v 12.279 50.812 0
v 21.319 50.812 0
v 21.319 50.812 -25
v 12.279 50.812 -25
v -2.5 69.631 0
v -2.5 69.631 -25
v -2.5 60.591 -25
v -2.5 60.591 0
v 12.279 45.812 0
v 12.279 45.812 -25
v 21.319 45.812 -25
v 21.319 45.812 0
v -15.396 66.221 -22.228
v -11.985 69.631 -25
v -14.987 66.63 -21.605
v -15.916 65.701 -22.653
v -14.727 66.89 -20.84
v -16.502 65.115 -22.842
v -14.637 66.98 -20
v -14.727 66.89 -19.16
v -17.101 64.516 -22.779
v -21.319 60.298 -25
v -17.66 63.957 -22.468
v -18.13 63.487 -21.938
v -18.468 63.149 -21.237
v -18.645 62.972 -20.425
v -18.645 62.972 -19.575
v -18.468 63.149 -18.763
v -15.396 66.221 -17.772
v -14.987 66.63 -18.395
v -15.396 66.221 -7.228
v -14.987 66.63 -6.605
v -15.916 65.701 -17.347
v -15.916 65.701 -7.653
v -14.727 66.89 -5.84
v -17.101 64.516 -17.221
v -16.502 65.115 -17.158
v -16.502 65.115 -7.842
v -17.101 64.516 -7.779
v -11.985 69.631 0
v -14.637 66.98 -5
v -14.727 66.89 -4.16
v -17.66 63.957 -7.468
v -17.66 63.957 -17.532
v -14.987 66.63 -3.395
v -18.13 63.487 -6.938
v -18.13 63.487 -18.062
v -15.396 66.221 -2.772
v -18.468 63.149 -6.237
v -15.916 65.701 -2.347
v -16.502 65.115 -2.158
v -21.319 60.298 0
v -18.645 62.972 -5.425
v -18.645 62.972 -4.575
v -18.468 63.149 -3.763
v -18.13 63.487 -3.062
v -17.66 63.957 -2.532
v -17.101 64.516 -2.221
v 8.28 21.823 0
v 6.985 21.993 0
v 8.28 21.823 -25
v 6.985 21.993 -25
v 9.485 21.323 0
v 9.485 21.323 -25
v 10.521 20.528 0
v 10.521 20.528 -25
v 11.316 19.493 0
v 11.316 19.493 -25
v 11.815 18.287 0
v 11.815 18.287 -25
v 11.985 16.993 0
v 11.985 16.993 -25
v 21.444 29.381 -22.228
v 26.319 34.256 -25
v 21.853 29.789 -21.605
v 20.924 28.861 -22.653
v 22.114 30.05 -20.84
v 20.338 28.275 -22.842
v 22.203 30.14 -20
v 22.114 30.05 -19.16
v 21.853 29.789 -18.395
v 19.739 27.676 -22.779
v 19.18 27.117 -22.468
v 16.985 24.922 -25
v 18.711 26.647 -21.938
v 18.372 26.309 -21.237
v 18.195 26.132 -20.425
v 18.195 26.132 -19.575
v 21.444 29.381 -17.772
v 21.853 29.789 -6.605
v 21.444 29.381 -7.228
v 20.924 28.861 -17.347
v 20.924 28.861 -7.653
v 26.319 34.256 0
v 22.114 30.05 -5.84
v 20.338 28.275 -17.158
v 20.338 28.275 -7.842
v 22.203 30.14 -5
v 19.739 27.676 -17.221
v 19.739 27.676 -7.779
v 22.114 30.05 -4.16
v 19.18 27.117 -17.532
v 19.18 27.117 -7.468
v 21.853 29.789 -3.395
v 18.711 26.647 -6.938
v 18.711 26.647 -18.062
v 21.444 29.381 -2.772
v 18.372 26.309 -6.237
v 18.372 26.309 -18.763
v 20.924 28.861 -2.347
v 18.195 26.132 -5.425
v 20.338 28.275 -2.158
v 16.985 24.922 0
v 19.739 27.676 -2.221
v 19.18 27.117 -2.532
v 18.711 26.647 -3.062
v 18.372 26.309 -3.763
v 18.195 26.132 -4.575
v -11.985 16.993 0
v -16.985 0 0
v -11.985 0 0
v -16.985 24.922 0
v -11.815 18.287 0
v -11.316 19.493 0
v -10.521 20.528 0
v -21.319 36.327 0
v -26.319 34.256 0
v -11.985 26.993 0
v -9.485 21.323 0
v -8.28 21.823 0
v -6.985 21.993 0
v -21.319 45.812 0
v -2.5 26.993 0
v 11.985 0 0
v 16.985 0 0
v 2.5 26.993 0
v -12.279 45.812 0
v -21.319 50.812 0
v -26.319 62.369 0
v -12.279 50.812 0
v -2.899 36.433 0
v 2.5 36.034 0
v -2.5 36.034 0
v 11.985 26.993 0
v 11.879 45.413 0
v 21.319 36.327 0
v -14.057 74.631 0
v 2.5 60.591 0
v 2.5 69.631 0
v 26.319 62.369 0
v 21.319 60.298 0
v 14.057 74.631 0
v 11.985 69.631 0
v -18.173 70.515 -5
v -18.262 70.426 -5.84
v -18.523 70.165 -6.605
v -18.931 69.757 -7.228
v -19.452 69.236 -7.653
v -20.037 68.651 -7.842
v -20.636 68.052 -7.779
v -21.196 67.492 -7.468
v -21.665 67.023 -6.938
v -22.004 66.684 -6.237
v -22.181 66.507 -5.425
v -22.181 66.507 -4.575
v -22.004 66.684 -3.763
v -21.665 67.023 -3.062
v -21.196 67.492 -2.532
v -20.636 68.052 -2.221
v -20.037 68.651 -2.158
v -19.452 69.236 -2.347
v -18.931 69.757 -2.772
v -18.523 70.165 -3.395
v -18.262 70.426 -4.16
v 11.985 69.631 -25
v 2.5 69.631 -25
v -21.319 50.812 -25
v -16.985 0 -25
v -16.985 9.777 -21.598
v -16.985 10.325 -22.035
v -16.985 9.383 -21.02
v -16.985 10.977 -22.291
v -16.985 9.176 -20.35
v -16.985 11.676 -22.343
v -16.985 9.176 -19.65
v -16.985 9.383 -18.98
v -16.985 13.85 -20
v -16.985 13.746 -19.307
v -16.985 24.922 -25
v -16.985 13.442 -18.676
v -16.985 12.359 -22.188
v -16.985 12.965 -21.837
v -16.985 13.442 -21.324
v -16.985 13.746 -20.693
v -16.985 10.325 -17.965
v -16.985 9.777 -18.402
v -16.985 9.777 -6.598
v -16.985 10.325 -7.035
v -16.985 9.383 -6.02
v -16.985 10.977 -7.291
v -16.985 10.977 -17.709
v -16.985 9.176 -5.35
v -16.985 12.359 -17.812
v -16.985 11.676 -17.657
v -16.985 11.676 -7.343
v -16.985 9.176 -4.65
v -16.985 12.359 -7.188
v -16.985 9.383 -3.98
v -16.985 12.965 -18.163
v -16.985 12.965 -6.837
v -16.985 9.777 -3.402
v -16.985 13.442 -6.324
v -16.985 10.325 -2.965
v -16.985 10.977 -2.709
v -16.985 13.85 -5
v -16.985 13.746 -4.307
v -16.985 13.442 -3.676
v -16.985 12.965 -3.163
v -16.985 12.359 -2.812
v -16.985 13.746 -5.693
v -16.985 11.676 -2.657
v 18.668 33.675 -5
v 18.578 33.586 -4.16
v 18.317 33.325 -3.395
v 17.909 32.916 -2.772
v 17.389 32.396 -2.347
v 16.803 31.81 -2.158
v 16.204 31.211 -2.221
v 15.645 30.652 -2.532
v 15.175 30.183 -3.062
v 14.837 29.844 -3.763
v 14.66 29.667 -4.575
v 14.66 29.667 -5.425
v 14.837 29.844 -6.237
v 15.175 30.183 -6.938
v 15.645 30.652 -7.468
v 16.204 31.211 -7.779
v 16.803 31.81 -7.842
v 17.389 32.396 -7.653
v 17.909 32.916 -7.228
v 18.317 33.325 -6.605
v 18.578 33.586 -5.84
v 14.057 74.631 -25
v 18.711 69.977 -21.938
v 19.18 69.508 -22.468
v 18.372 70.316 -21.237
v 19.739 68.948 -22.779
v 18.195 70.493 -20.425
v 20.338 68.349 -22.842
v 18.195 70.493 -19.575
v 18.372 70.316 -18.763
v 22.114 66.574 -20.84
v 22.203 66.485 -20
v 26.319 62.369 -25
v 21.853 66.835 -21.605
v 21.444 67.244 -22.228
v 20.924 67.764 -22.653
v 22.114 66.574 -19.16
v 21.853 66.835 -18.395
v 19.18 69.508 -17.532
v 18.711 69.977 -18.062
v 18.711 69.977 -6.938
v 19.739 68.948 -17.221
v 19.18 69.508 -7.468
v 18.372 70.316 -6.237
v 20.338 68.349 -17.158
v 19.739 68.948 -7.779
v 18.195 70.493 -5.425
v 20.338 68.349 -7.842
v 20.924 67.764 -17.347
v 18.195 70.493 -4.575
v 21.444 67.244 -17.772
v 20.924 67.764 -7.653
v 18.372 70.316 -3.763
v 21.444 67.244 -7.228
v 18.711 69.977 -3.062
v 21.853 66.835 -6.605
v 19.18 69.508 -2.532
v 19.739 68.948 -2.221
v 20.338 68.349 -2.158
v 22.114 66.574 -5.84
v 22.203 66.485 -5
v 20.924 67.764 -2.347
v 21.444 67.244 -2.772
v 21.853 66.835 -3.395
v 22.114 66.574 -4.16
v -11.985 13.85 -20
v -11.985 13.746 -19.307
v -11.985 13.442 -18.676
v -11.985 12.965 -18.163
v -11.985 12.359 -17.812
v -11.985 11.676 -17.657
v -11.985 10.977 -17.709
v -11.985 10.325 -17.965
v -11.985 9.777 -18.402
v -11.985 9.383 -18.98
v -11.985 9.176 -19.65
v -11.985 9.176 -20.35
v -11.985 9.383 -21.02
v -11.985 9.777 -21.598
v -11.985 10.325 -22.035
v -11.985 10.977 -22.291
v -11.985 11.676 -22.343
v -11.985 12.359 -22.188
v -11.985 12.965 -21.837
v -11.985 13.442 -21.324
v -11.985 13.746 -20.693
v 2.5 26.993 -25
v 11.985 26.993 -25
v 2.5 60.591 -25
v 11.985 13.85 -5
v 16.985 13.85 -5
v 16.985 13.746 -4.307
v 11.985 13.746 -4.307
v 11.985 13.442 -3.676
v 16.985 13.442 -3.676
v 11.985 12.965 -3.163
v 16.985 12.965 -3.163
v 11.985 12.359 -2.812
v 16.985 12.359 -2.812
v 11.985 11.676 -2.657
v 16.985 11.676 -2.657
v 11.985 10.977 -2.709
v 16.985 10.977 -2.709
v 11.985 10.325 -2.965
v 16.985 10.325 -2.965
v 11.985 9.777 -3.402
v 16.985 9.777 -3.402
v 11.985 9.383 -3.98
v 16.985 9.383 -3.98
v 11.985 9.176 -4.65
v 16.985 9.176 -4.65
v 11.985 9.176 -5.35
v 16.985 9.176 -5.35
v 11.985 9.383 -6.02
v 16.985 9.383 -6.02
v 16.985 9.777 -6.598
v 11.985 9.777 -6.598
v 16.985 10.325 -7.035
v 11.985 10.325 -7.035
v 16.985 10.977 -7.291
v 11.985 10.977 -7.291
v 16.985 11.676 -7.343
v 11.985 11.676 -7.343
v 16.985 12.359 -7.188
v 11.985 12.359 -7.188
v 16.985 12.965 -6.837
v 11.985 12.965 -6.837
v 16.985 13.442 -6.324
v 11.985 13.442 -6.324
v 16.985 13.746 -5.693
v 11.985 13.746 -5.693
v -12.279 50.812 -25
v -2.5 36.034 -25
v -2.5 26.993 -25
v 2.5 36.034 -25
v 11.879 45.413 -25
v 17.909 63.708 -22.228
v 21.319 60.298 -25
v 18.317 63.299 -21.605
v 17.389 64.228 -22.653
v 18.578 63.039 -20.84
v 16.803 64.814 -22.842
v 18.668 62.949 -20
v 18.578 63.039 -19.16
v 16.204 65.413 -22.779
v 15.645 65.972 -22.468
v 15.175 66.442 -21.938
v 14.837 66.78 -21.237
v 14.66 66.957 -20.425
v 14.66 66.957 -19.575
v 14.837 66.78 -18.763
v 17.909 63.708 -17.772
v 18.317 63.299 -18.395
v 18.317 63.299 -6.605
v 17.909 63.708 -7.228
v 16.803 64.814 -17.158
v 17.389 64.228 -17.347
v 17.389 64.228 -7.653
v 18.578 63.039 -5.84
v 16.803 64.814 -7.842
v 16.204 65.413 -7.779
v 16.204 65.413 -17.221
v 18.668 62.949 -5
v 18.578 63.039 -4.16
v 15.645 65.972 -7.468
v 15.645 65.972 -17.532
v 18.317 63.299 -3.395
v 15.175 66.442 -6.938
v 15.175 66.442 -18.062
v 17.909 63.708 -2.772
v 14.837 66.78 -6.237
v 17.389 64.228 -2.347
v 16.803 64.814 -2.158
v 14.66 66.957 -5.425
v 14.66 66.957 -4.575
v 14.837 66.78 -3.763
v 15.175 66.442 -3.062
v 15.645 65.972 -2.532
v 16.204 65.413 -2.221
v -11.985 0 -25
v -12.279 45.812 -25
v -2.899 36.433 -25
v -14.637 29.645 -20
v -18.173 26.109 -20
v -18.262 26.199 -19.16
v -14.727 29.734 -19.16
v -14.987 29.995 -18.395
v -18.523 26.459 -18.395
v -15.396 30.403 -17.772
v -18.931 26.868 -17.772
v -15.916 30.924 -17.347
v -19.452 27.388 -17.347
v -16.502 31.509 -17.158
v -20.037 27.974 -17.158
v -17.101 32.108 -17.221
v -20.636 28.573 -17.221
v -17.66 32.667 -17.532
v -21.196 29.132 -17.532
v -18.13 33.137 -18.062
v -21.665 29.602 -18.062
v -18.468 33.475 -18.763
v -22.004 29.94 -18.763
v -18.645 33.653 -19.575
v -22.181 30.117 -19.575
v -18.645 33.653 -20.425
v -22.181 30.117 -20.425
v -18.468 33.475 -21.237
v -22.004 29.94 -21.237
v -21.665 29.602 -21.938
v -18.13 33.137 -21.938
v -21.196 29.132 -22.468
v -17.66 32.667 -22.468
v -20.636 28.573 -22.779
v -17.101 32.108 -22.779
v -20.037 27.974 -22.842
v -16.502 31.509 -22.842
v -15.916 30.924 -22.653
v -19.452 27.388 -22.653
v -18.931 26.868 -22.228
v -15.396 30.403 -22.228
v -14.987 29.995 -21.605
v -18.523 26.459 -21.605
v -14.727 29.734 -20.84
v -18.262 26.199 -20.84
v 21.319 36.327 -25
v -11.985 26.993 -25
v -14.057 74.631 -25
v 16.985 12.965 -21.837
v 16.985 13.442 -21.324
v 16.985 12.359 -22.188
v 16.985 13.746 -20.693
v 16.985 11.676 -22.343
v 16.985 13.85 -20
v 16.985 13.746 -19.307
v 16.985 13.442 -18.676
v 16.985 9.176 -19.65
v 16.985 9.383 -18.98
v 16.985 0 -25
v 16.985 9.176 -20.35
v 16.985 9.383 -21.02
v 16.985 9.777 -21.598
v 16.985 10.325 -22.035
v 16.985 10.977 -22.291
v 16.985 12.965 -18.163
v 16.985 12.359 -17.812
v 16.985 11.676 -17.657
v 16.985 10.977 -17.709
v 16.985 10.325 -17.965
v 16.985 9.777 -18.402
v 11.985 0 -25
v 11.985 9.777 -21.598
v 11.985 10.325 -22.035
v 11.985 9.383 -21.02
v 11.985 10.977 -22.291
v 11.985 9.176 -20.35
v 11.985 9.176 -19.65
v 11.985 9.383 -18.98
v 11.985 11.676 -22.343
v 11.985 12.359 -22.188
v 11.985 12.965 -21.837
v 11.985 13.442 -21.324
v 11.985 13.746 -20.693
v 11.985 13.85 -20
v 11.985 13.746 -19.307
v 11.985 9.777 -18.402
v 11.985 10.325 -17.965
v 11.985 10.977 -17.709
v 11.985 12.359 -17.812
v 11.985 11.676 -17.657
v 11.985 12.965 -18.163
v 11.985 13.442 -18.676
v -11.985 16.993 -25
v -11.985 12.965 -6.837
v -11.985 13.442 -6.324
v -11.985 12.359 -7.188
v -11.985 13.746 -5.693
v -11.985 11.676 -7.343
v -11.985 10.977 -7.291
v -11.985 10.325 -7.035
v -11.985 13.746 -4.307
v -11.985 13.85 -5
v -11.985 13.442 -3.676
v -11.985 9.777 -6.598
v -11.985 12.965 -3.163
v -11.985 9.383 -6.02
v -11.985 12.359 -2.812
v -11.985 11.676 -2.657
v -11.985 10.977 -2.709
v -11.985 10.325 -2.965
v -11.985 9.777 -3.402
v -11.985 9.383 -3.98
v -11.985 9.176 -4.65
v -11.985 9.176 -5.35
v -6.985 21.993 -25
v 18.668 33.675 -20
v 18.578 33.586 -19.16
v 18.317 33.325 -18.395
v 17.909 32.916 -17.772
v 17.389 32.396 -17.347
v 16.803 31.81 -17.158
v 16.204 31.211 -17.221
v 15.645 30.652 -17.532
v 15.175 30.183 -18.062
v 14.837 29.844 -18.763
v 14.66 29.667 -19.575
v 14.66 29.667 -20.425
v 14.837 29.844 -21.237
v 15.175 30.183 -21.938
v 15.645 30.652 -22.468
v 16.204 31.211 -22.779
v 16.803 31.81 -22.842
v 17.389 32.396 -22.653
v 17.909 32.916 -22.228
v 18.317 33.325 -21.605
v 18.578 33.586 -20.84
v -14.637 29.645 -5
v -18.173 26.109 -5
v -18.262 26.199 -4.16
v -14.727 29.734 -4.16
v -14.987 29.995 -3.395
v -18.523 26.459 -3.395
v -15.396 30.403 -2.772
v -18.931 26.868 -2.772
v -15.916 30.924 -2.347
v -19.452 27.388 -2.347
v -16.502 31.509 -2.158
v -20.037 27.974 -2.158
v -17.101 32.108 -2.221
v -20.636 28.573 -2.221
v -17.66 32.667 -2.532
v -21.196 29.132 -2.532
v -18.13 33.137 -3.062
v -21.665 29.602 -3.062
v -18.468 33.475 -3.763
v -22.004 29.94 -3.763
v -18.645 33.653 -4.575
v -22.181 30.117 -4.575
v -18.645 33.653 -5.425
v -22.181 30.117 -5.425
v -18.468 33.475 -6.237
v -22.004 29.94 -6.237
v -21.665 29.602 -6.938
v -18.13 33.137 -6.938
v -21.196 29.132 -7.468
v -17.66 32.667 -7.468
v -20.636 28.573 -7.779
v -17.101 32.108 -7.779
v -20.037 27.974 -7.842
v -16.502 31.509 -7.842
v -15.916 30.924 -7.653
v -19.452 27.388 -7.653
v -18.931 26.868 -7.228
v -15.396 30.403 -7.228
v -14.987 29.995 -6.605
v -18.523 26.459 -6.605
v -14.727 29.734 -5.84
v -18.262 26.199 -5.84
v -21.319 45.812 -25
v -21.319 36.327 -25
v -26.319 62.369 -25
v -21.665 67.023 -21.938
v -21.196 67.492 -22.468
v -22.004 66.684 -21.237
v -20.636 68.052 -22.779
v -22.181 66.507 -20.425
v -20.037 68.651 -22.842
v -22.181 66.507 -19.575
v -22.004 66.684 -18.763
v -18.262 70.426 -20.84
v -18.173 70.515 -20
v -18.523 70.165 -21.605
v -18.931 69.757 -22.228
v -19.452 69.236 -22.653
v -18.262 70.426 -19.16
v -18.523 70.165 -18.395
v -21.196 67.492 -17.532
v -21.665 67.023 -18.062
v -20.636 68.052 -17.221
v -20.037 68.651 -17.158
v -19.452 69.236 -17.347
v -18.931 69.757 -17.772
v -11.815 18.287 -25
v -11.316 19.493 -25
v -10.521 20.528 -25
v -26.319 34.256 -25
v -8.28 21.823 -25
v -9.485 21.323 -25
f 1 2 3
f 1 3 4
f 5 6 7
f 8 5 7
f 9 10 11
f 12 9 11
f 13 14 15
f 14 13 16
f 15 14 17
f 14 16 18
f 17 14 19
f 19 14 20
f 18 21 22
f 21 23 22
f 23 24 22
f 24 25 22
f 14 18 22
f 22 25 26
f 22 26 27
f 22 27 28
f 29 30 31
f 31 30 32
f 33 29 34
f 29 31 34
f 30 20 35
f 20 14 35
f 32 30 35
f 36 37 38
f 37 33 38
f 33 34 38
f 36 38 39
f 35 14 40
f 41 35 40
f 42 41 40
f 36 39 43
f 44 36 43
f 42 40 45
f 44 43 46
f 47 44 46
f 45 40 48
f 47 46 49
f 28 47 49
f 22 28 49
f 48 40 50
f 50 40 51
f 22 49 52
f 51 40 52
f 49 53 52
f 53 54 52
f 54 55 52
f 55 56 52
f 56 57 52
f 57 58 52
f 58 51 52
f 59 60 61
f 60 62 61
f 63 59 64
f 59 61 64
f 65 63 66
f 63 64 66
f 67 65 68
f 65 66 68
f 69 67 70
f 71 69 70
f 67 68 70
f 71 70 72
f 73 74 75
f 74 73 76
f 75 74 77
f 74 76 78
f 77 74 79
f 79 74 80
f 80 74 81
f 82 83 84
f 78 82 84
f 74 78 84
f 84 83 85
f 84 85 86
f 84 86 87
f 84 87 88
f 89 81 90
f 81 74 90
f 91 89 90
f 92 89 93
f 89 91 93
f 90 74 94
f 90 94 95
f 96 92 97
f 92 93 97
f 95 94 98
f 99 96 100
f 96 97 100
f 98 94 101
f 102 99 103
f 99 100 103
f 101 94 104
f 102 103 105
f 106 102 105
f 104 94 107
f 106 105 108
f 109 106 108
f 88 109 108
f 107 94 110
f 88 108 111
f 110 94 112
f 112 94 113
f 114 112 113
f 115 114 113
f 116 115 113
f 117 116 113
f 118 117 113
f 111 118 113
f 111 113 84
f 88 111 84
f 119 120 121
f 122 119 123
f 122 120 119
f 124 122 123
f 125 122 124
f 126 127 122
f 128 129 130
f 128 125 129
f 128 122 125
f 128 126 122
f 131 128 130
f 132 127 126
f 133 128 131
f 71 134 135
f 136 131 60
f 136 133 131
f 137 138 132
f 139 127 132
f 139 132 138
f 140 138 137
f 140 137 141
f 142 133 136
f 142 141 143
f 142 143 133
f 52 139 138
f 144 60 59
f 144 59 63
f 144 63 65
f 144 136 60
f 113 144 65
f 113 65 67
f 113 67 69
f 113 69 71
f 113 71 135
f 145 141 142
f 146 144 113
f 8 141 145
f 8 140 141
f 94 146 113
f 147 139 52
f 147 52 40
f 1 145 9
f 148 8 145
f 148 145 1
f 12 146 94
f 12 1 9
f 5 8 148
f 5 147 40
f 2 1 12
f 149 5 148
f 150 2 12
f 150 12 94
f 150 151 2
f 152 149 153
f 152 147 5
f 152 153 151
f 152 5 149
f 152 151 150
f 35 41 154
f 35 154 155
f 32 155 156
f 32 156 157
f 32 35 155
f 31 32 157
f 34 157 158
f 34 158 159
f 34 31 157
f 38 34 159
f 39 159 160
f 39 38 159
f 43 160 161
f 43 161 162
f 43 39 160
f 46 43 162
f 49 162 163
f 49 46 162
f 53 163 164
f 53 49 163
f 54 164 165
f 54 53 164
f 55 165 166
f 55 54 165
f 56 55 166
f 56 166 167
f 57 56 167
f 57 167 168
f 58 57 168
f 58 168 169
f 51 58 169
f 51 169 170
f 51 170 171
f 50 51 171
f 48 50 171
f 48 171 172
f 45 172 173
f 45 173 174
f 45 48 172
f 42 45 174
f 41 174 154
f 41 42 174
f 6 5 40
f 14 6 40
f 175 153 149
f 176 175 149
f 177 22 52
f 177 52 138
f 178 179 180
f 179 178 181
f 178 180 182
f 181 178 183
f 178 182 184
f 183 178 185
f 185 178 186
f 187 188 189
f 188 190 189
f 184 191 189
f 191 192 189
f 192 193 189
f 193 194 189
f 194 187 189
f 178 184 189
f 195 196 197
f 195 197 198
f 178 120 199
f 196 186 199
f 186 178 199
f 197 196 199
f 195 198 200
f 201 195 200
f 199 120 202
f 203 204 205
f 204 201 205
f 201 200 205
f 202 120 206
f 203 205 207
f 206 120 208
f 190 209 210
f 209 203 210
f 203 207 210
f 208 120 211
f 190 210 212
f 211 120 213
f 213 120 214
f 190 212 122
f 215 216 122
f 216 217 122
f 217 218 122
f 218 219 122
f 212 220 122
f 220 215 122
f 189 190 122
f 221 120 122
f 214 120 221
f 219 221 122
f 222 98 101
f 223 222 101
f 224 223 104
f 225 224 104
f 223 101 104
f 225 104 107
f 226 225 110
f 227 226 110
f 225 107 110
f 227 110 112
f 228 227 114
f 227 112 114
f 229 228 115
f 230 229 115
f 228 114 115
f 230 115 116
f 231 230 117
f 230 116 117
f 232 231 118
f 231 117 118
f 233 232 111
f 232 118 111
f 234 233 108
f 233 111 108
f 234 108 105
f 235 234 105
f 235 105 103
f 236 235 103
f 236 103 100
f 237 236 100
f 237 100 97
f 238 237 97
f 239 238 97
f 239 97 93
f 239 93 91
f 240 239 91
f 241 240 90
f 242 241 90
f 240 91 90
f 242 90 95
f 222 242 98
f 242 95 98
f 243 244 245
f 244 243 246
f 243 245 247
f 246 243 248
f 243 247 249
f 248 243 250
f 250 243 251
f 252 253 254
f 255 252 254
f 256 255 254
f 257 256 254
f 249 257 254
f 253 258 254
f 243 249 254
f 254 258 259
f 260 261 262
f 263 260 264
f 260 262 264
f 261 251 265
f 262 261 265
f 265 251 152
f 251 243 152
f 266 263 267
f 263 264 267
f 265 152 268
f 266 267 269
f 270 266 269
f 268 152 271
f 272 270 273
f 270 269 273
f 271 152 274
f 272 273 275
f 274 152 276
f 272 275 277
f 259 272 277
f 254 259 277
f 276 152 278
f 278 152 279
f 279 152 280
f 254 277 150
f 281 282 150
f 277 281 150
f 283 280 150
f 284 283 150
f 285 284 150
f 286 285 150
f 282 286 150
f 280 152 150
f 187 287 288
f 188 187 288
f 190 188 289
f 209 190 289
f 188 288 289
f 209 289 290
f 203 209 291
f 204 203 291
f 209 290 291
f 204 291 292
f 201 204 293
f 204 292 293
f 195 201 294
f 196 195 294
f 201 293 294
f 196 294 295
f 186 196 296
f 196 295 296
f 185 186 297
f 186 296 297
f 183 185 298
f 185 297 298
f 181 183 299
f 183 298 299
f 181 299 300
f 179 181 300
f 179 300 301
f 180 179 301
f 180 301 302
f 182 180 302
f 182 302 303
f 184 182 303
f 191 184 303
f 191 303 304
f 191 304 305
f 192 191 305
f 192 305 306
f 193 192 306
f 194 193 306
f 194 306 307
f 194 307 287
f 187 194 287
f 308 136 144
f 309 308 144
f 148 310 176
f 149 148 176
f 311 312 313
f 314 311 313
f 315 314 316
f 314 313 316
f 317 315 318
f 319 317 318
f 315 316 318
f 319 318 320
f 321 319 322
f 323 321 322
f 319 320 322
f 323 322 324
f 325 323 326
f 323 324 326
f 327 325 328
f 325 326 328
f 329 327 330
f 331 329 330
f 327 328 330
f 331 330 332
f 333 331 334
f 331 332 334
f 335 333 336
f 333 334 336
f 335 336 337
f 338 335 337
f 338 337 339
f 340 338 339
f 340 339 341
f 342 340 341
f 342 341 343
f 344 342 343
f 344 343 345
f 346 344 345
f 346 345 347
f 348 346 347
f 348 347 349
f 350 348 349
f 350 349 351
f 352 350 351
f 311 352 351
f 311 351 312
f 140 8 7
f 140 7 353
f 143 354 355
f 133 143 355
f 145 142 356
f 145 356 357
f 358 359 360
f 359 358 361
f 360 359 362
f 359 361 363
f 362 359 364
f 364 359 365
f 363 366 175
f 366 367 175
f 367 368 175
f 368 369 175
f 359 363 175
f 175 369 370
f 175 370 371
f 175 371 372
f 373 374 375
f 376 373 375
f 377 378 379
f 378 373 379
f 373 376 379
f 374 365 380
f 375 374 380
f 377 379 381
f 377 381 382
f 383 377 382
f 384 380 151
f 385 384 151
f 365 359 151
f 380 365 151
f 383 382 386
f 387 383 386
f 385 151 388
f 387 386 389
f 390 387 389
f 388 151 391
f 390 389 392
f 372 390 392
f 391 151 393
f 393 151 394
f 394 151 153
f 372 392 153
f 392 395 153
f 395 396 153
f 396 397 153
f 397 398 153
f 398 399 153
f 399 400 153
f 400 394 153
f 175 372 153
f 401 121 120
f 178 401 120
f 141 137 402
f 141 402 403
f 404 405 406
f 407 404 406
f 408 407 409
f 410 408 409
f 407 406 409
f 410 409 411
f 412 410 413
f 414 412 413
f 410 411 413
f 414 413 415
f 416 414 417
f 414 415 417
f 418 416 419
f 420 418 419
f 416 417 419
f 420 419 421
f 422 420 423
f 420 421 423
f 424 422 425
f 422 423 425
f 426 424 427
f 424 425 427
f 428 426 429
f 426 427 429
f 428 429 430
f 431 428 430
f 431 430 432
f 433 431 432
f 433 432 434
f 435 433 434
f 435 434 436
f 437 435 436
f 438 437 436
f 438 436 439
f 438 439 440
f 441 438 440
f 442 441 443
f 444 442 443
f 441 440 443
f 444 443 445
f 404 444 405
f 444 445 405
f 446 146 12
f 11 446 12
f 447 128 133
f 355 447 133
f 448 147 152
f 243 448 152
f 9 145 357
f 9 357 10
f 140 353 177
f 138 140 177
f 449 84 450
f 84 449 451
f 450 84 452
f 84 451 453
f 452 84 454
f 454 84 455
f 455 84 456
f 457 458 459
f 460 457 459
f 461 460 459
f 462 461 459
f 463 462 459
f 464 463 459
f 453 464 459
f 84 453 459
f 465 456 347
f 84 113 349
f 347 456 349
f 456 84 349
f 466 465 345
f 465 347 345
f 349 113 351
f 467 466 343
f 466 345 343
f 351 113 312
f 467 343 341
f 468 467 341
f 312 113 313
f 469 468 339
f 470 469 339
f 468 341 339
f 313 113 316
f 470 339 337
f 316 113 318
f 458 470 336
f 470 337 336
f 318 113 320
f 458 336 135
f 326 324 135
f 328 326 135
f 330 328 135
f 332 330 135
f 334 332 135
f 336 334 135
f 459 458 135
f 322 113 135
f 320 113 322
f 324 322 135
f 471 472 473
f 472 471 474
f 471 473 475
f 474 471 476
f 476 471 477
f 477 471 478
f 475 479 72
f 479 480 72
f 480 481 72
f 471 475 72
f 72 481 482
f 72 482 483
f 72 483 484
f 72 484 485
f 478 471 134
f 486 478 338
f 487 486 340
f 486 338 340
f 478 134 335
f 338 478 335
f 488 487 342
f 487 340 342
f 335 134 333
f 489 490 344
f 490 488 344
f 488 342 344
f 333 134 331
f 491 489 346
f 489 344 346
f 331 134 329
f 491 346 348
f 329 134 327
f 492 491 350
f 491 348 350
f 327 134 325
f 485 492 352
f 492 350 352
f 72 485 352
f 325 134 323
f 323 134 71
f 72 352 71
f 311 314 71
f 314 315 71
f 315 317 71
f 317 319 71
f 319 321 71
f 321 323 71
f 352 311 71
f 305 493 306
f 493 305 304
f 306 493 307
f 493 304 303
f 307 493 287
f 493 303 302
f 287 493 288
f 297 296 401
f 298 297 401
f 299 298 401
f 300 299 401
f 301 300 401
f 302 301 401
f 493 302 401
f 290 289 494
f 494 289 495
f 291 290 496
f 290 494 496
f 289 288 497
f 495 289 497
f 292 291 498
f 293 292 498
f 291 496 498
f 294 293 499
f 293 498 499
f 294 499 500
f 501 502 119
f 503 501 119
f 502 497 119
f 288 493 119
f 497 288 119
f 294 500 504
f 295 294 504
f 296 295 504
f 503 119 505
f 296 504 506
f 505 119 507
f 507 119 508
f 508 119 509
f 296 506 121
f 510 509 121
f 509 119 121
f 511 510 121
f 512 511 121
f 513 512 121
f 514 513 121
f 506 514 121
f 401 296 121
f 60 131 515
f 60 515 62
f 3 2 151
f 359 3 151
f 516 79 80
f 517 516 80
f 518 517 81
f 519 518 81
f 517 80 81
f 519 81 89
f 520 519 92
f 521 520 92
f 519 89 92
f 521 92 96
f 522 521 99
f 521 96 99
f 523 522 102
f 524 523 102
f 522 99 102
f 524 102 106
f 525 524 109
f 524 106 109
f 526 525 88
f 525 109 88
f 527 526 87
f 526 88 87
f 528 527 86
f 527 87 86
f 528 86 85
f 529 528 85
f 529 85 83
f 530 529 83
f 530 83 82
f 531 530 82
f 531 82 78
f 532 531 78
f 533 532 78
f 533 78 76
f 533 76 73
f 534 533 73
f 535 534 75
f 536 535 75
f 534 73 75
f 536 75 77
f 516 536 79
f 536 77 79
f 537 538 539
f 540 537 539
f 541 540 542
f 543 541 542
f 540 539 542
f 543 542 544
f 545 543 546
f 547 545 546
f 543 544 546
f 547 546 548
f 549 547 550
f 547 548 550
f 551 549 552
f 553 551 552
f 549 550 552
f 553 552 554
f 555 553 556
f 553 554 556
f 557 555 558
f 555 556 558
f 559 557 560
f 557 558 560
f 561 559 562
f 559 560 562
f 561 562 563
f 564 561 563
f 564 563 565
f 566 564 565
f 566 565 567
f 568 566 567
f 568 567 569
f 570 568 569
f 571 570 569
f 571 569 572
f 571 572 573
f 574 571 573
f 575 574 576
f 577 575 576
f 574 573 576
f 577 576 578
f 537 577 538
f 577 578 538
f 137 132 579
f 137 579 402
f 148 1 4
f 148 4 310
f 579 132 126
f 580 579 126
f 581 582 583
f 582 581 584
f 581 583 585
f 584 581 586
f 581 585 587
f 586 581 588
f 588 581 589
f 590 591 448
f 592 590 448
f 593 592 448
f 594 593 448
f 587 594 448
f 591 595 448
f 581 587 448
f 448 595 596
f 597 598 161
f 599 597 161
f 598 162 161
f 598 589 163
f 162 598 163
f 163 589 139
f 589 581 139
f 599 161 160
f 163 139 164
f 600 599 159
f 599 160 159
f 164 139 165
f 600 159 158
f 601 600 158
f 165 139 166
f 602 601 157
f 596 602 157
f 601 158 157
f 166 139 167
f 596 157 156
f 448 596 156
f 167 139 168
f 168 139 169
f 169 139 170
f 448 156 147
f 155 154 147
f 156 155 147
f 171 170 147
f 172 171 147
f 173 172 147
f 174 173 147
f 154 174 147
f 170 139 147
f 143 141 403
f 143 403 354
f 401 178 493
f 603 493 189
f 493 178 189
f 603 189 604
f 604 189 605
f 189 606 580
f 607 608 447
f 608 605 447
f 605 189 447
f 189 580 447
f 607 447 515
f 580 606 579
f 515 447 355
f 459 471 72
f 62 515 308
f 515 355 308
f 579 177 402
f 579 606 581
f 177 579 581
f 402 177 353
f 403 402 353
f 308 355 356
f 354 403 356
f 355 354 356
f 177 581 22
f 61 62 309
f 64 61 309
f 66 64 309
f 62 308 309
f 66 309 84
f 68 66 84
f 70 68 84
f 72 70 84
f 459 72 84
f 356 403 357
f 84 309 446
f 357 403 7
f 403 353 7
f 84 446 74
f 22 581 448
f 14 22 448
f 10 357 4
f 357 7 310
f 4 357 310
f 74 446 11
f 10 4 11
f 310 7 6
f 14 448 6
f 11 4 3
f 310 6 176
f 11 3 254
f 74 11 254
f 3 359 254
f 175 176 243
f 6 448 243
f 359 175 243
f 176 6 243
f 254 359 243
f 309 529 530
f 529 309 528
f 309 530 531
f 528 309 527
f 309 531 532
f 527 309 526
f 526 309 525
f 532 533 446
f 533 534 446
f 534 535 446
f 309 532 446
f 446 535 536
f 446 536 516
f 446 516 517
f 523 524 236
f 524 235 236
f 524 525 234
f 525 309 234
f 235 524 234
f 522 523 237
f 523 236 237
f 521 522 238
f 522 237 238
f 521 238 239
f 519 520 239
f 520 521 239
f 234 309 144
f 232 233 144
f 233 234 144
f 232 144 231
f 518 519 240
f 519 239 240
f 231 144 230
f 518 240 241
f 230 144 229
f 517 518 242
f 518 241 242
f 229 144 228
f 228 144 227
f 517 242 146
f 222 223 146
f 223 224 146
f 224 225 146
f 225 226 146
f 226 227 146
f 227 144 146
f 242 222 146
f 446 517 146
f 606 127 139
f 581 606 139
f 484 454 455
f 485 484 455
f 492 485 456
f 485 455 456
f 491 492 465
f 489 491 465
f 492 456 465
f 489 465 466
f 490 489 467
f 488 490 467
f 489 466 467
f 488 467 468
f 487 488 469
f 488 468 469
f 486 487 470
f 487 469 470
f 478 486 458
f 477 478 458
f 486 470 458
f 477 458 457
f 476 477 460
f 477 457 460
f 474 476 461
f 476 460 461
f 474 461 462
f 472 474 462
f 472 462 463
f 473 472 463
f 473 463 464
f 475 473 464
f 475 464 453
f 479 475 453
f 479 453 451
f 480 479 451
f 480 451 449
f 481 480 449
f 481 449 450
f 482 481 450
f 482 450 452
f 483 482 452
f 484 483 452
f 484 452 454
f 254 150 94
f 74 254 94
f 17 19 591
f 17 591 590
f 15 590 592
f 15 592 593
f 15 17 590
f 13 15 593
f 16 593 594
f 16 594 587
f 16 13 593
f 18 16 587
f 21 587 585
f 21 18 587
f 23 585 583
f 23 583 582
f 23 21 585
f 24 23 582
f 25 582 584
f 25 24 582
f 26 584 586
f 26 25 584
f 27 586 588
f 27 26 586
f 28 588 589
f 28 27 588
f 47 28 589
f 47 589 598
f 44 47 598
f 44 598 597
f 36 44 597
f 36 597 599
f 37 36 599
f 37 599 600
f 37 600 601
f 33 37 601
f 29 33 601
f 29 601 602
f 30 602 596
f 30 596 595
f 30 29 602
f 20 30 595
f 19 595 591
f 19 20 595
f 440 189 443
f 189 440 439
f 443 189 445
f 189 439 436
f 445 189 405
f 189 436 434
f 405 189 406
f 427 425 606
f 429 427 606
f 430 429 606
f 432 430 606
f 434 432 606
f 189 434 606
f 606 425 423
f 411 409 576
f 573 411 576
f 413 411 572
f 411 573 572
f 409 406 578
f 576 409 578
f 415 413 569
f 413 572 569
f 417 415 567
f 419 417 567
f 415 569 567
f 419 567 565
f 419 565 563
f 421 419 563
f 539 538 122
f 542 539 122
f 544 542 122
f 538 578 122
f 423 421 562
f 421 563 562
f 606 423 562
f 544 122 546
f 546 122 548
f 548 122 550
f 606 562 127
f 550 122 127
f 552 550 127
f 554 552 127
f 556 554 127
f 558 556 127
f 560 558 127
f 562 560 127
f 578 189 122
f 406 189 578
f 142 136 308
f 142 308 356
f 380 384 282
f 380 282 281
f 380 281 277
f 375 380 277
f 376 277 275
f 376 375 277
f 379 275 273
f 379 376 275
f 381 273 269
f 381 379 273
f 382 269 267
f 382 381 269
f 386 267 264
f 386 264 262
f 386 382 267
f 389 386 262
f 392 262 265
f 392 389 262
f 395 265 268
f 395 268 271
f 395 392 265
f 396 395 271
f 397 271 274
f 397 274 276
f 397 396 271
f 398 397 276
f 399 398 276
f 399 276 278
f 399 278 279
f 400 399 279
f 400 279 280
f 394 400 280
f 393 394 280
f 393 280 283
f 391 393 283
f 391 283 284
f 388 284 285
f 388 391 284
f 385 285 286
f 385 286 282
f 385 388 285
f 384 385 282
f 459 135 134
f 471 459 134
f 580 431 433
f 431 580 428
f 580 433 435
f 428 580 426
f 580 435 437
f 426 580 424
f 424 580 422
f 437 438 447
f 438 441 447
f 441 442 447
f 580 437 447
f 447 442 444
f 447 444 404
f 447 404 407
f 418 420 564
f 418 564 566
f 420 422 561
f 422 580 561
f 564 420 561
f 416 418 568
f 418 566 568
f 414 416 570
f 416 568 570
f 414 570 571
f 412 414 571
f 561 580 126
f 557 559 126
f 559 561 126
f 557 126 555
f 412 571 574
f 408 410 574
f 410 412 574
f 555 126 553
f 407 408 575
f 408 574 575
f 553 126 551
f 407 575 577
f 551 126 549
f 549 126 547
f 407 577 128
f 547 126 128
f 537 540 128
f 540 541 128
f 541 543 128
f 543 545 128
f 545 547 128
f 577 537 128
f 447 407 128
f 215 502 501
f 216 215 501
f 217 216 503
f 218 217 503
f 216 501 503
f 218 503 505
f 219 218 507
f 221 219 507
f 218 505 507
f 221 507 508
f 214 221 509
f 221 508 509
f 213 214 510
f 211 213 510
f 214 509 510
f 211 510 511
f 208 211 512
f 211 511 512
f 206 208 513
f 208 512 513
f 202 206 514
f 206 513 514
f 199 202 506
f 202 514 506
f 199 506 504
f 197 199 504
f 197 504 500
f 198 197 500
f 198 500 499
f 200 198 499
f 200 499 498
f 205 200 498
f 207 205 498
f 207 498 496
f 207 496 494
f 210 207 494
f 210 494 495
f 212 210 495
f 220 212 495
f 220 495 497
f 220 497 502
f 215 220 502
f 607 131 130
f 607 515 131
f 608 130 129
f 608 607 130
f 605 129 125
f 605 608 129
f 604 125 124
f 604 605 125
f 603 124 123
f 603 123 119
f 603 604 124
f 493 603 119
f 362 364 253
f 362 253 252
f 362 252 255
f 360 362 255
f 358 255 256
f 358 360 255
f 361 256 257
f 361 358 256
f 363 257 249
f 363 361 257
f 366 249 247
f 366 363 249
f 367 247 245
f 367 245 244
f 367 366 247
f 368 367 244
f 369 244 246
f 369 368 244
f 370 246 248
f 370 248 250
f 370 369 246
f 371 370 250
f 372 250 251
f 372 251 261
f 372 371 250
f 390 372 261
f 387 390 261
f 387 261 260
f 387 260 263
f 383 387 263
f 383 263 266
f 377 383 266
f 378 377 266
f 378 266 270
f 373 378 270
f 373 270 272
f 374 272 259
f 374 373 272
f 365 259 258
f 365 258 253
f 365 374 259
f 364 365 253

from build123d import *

# Parameters (mm, degrees)
EXTRUDE_THIN1_DEPTH = 25
SKETCH5_W           = 23.970919882
SKETCH5_H           = 5
BOSS_EXTRUDE2_DEPTH = 25
BOSS_EXTRUDE3_DEPTH = 25
SKETCH6_R           = 2.85
CUT_EXTRUDE1_DEPTH  = 5
SKETCH9_R           = 2.85
CUT_EXTRUDE2_DEPTH  = 5
CUT_EXTRUDE3_START  = -5
SKETCH10_R          = 2.85
CUT_EXTRUDE3_DEPTH  = 5
CUT_EXTRUDE4_START  = -5
SKETCH11_R          = 2.85
CUT_EXTRUDE4_DEPTH  = 5
FILLET1_R           = 5
CUT_EXTRUDE5_REACH  = 91.834
SKETCH12_R          = 2.35


with BuildPart() as part:
    # Sketch1 → Extrude-Thin1 (new body)
    with BuildSketch(Plane.XY):
        Polygon((11.985459941, 0), (11.985459941, 26.992888143), (21.319269453, 36.326697654), (21.319269453, 60.297617537), (11.985459941, 69.631427048), (-11.985459941, 69.631427048), (-21.319269453, 60.297617537), (-21.319269453, 36.326697654), (-11.985459941, 26.992888143), (-11.985459941, 0), (-16.985459941, 0), (-16.985459941, 24.921820331), (-26.319269453, 34.255629842), (-26.319269453, 62.368685348), (-14.056527753, 74.631427048), (14.056527753, 74.631427048), (26.319269453, 62.368685348), (26.319269453, 34.255629842), (16.985459941, 24.921820331), (16.985459941, 0), align=None)
    extrude(amount=-EXTRUDE_THIN1_DEPTH)

    # Sketch5 → Boss-Extrude2 (add)
    with BuildSketch(Plane.XY):
        with Locations((0, 24.492888143)):
            Rectangle(SKETCH5_W, SKETCH5_H)
    extrude(amount=-BOSS_EXTRUDE2_DEPTH)

    # Sketch3 → Boss-Extrude3 (add)
    with BuildSketch(Plane.XY):
        Polygon((-2.5, 36.033625869), (-2.5, 26.992888143), (2.5, 26.992888143), (2.5, 36.033625869), (2.899137803, 36.432763672), (11.879393924, 45.413019793), (12.278531727, 45.812157595), (21.319269453, 45.812157595), (21.319269453, 50.812157595), (12.278531727, 50.812157595), (11.879393924, 51.211295398), (2.899137803, 60.191551519), (2.5, 60.590689322), (2.5, 69.631427048), (-2.5, 69.631427048), (-2.5, 60.590689322), (-2.899137803, 60.191551519), (-12.278531727, 50.812157595), (-21.319269453, 50.812157595), (-21.319269453, 45.812157595), (-12.278531727, 45.812157595), (-2.899137803, 36.432763672), align=None)
    extrude(amount=-BOSS_EXTRUDE3_DEPTH)

    # Sketch6 → Cut-Extrude1 (cut)
    with BuildSketch(Plane(origin=(3.968180195, 3.968180195, 0), x_dir=(0, 0, 1), z_dir=(-0.7071067811865479, -0.7071067811865471, 0))):
        with Locations(Location((-20, 34.161854249, 0), (0, 0, 270))):
            Circle(SKETCH6_R)
        with Locations(Location((-5, 34.161854249, 0), (0, 0, 270))):
            Circle(SKETCH6_R)
    extrude(amount=-CUT_EXTRUDE1_DEPTH, mode=Mode.SUBTRACT)

    # Sketch9 → Cut-Extrude2 (cut)
    with BuildSketch(Plane(origin=(-3.968180195, 3.968180195, 0), x_dir=(0, 0, 1), z_dir=(0.7071067811865479, -0.7071067811865471, 0))):
        with Locations(Location((-20, -34.161854249, 0), (0, 0, 270))):
            Circle(SKETCH9_R)
        with Locations(Location((-5, -34.161854249, 0), (0, 0, 270))):
            Circle(SKETCH9_R)
    extrude(amount=-CUT_EXTRUDE2_DEPTH, mode=Mode.SUBTRACT)

    # Sketch10 → Cut-Extrude3 (cut)
    with BuildSketch(Plane(origin=(-44.343977401, 44.343977401, 0), x_dir=(0, 0, 1), z_dir=(-0.7071067811865471, 0.707106781186548, 0)).offset(CUT_EXTRUDE3_START)):
        with Locations(Location((-20, 34.161854249, 0), (0, 0, 90))):
            Circle(SKETCH10_R)
        with Locations(Location((-5, 34.161854249, 0), (0, 0, 90))):
            Circle(SKETCH10_R)
    extrude(amount=CUT_EXTRUDE3_DEPTH, mode=Mode.SUBTRACT)

    # Sketch11 → Cut-Extrude4 (cut)
    with BuildSketch(Plane(origin=(44.343977401, 44.343977401, 0), x_dir=(0, 0, -1), z_dir=(0.7071067811865471, 0.707106781186548, 0)).offset(CUT_EXTRUDE4_START)):
        with Locations(Location((5, 34.161854249, 0), (0, 0, 270))):
            Circle(SKETCH11_R)
        with Locations(Location((20, 34.161854249, 0), (0, 0, 270))):
            Circle(SKETCH11_R)
    extrude(amount=CUT_EXTRUDE4_DEPTH, mode=Mode.SUBTRACT)

    # Fillet1
    fillet1_edges = [part.edges().sort_by_distance(p)[0] for p in [
        (11.985459941, 21.992888143, -12.5),
        (-11.985459941, 21.992888143, -12.5),
    ]]
    fillet(fillet1_edges, radius=FILLET1_R)

    # Cut-Extrude5: up to this face of the body (flat: up to its plane)
    cut_extrude5_end = Plane(part.part.faces().sort_by_distance((-16.985459941, 12.460910165, -12.5))[0])
    # Sketch12 → Cut-Extrude5 (cut, up to the picked face)
    with BuildSketch(Plane(origin=(16.985459941, 0, 0), x_dir=(0, 0, -1), z_dir=(1, 0, 0)), mode=Mode.PRIVATE) as cut_extrude5_sk1:
        with Locations(Location((20, 11.5, 0), (0, 0, 90))):
            Circle(SKETCH12_R)
    cut_extrude5_tool1 = split(extrude(cut_extrude5_sk1.sketch, amount=-CUT_EXTRUDE5_REACH, mode=Mode.PRIVATE), bisect_by=cut_extrude5_end, keep=Keep.BOTH, mode=Mode.PRIVATE)
    # Sketch12 → Cut-Extrude5 (cut, up to the picked face)
    with BuildSketch(Plane(origin=(16.985459941, 0, 0), x_dir=(0, 0, -1), z_dir=(1, 0, 0)), mode=Mode.PRIVATE) as cut_extrude5_sk2:
        with Locations(Location((5, 11.5, 0), (0, 0, 90))):
            Circle(SKETCH12_R)
    cut_extrude5_tool2 = split(extrude(cut_extrude5_sk2.sketch, amount=-CUT_EXTRUDE5_REACH, mode=Mode.PRIVATE), bisect_by=cut_extrude5_end, keep=Keep.BOTH, mode=Mode.PRIVATE)
    add(cut_extrude5_tool1.solids().sort_by(Axis((16.98546, 11.5, -20), (-1, 0, 0)))[0], mode=Mode.SUBTRACT)
    add(cut_extrude5_tool2.solids().sort_by(Axis((16.98546, 11.5, -5), (-1, 0, 0)))[0], mode=Mode.SUBTRACT)


solid = part.part
